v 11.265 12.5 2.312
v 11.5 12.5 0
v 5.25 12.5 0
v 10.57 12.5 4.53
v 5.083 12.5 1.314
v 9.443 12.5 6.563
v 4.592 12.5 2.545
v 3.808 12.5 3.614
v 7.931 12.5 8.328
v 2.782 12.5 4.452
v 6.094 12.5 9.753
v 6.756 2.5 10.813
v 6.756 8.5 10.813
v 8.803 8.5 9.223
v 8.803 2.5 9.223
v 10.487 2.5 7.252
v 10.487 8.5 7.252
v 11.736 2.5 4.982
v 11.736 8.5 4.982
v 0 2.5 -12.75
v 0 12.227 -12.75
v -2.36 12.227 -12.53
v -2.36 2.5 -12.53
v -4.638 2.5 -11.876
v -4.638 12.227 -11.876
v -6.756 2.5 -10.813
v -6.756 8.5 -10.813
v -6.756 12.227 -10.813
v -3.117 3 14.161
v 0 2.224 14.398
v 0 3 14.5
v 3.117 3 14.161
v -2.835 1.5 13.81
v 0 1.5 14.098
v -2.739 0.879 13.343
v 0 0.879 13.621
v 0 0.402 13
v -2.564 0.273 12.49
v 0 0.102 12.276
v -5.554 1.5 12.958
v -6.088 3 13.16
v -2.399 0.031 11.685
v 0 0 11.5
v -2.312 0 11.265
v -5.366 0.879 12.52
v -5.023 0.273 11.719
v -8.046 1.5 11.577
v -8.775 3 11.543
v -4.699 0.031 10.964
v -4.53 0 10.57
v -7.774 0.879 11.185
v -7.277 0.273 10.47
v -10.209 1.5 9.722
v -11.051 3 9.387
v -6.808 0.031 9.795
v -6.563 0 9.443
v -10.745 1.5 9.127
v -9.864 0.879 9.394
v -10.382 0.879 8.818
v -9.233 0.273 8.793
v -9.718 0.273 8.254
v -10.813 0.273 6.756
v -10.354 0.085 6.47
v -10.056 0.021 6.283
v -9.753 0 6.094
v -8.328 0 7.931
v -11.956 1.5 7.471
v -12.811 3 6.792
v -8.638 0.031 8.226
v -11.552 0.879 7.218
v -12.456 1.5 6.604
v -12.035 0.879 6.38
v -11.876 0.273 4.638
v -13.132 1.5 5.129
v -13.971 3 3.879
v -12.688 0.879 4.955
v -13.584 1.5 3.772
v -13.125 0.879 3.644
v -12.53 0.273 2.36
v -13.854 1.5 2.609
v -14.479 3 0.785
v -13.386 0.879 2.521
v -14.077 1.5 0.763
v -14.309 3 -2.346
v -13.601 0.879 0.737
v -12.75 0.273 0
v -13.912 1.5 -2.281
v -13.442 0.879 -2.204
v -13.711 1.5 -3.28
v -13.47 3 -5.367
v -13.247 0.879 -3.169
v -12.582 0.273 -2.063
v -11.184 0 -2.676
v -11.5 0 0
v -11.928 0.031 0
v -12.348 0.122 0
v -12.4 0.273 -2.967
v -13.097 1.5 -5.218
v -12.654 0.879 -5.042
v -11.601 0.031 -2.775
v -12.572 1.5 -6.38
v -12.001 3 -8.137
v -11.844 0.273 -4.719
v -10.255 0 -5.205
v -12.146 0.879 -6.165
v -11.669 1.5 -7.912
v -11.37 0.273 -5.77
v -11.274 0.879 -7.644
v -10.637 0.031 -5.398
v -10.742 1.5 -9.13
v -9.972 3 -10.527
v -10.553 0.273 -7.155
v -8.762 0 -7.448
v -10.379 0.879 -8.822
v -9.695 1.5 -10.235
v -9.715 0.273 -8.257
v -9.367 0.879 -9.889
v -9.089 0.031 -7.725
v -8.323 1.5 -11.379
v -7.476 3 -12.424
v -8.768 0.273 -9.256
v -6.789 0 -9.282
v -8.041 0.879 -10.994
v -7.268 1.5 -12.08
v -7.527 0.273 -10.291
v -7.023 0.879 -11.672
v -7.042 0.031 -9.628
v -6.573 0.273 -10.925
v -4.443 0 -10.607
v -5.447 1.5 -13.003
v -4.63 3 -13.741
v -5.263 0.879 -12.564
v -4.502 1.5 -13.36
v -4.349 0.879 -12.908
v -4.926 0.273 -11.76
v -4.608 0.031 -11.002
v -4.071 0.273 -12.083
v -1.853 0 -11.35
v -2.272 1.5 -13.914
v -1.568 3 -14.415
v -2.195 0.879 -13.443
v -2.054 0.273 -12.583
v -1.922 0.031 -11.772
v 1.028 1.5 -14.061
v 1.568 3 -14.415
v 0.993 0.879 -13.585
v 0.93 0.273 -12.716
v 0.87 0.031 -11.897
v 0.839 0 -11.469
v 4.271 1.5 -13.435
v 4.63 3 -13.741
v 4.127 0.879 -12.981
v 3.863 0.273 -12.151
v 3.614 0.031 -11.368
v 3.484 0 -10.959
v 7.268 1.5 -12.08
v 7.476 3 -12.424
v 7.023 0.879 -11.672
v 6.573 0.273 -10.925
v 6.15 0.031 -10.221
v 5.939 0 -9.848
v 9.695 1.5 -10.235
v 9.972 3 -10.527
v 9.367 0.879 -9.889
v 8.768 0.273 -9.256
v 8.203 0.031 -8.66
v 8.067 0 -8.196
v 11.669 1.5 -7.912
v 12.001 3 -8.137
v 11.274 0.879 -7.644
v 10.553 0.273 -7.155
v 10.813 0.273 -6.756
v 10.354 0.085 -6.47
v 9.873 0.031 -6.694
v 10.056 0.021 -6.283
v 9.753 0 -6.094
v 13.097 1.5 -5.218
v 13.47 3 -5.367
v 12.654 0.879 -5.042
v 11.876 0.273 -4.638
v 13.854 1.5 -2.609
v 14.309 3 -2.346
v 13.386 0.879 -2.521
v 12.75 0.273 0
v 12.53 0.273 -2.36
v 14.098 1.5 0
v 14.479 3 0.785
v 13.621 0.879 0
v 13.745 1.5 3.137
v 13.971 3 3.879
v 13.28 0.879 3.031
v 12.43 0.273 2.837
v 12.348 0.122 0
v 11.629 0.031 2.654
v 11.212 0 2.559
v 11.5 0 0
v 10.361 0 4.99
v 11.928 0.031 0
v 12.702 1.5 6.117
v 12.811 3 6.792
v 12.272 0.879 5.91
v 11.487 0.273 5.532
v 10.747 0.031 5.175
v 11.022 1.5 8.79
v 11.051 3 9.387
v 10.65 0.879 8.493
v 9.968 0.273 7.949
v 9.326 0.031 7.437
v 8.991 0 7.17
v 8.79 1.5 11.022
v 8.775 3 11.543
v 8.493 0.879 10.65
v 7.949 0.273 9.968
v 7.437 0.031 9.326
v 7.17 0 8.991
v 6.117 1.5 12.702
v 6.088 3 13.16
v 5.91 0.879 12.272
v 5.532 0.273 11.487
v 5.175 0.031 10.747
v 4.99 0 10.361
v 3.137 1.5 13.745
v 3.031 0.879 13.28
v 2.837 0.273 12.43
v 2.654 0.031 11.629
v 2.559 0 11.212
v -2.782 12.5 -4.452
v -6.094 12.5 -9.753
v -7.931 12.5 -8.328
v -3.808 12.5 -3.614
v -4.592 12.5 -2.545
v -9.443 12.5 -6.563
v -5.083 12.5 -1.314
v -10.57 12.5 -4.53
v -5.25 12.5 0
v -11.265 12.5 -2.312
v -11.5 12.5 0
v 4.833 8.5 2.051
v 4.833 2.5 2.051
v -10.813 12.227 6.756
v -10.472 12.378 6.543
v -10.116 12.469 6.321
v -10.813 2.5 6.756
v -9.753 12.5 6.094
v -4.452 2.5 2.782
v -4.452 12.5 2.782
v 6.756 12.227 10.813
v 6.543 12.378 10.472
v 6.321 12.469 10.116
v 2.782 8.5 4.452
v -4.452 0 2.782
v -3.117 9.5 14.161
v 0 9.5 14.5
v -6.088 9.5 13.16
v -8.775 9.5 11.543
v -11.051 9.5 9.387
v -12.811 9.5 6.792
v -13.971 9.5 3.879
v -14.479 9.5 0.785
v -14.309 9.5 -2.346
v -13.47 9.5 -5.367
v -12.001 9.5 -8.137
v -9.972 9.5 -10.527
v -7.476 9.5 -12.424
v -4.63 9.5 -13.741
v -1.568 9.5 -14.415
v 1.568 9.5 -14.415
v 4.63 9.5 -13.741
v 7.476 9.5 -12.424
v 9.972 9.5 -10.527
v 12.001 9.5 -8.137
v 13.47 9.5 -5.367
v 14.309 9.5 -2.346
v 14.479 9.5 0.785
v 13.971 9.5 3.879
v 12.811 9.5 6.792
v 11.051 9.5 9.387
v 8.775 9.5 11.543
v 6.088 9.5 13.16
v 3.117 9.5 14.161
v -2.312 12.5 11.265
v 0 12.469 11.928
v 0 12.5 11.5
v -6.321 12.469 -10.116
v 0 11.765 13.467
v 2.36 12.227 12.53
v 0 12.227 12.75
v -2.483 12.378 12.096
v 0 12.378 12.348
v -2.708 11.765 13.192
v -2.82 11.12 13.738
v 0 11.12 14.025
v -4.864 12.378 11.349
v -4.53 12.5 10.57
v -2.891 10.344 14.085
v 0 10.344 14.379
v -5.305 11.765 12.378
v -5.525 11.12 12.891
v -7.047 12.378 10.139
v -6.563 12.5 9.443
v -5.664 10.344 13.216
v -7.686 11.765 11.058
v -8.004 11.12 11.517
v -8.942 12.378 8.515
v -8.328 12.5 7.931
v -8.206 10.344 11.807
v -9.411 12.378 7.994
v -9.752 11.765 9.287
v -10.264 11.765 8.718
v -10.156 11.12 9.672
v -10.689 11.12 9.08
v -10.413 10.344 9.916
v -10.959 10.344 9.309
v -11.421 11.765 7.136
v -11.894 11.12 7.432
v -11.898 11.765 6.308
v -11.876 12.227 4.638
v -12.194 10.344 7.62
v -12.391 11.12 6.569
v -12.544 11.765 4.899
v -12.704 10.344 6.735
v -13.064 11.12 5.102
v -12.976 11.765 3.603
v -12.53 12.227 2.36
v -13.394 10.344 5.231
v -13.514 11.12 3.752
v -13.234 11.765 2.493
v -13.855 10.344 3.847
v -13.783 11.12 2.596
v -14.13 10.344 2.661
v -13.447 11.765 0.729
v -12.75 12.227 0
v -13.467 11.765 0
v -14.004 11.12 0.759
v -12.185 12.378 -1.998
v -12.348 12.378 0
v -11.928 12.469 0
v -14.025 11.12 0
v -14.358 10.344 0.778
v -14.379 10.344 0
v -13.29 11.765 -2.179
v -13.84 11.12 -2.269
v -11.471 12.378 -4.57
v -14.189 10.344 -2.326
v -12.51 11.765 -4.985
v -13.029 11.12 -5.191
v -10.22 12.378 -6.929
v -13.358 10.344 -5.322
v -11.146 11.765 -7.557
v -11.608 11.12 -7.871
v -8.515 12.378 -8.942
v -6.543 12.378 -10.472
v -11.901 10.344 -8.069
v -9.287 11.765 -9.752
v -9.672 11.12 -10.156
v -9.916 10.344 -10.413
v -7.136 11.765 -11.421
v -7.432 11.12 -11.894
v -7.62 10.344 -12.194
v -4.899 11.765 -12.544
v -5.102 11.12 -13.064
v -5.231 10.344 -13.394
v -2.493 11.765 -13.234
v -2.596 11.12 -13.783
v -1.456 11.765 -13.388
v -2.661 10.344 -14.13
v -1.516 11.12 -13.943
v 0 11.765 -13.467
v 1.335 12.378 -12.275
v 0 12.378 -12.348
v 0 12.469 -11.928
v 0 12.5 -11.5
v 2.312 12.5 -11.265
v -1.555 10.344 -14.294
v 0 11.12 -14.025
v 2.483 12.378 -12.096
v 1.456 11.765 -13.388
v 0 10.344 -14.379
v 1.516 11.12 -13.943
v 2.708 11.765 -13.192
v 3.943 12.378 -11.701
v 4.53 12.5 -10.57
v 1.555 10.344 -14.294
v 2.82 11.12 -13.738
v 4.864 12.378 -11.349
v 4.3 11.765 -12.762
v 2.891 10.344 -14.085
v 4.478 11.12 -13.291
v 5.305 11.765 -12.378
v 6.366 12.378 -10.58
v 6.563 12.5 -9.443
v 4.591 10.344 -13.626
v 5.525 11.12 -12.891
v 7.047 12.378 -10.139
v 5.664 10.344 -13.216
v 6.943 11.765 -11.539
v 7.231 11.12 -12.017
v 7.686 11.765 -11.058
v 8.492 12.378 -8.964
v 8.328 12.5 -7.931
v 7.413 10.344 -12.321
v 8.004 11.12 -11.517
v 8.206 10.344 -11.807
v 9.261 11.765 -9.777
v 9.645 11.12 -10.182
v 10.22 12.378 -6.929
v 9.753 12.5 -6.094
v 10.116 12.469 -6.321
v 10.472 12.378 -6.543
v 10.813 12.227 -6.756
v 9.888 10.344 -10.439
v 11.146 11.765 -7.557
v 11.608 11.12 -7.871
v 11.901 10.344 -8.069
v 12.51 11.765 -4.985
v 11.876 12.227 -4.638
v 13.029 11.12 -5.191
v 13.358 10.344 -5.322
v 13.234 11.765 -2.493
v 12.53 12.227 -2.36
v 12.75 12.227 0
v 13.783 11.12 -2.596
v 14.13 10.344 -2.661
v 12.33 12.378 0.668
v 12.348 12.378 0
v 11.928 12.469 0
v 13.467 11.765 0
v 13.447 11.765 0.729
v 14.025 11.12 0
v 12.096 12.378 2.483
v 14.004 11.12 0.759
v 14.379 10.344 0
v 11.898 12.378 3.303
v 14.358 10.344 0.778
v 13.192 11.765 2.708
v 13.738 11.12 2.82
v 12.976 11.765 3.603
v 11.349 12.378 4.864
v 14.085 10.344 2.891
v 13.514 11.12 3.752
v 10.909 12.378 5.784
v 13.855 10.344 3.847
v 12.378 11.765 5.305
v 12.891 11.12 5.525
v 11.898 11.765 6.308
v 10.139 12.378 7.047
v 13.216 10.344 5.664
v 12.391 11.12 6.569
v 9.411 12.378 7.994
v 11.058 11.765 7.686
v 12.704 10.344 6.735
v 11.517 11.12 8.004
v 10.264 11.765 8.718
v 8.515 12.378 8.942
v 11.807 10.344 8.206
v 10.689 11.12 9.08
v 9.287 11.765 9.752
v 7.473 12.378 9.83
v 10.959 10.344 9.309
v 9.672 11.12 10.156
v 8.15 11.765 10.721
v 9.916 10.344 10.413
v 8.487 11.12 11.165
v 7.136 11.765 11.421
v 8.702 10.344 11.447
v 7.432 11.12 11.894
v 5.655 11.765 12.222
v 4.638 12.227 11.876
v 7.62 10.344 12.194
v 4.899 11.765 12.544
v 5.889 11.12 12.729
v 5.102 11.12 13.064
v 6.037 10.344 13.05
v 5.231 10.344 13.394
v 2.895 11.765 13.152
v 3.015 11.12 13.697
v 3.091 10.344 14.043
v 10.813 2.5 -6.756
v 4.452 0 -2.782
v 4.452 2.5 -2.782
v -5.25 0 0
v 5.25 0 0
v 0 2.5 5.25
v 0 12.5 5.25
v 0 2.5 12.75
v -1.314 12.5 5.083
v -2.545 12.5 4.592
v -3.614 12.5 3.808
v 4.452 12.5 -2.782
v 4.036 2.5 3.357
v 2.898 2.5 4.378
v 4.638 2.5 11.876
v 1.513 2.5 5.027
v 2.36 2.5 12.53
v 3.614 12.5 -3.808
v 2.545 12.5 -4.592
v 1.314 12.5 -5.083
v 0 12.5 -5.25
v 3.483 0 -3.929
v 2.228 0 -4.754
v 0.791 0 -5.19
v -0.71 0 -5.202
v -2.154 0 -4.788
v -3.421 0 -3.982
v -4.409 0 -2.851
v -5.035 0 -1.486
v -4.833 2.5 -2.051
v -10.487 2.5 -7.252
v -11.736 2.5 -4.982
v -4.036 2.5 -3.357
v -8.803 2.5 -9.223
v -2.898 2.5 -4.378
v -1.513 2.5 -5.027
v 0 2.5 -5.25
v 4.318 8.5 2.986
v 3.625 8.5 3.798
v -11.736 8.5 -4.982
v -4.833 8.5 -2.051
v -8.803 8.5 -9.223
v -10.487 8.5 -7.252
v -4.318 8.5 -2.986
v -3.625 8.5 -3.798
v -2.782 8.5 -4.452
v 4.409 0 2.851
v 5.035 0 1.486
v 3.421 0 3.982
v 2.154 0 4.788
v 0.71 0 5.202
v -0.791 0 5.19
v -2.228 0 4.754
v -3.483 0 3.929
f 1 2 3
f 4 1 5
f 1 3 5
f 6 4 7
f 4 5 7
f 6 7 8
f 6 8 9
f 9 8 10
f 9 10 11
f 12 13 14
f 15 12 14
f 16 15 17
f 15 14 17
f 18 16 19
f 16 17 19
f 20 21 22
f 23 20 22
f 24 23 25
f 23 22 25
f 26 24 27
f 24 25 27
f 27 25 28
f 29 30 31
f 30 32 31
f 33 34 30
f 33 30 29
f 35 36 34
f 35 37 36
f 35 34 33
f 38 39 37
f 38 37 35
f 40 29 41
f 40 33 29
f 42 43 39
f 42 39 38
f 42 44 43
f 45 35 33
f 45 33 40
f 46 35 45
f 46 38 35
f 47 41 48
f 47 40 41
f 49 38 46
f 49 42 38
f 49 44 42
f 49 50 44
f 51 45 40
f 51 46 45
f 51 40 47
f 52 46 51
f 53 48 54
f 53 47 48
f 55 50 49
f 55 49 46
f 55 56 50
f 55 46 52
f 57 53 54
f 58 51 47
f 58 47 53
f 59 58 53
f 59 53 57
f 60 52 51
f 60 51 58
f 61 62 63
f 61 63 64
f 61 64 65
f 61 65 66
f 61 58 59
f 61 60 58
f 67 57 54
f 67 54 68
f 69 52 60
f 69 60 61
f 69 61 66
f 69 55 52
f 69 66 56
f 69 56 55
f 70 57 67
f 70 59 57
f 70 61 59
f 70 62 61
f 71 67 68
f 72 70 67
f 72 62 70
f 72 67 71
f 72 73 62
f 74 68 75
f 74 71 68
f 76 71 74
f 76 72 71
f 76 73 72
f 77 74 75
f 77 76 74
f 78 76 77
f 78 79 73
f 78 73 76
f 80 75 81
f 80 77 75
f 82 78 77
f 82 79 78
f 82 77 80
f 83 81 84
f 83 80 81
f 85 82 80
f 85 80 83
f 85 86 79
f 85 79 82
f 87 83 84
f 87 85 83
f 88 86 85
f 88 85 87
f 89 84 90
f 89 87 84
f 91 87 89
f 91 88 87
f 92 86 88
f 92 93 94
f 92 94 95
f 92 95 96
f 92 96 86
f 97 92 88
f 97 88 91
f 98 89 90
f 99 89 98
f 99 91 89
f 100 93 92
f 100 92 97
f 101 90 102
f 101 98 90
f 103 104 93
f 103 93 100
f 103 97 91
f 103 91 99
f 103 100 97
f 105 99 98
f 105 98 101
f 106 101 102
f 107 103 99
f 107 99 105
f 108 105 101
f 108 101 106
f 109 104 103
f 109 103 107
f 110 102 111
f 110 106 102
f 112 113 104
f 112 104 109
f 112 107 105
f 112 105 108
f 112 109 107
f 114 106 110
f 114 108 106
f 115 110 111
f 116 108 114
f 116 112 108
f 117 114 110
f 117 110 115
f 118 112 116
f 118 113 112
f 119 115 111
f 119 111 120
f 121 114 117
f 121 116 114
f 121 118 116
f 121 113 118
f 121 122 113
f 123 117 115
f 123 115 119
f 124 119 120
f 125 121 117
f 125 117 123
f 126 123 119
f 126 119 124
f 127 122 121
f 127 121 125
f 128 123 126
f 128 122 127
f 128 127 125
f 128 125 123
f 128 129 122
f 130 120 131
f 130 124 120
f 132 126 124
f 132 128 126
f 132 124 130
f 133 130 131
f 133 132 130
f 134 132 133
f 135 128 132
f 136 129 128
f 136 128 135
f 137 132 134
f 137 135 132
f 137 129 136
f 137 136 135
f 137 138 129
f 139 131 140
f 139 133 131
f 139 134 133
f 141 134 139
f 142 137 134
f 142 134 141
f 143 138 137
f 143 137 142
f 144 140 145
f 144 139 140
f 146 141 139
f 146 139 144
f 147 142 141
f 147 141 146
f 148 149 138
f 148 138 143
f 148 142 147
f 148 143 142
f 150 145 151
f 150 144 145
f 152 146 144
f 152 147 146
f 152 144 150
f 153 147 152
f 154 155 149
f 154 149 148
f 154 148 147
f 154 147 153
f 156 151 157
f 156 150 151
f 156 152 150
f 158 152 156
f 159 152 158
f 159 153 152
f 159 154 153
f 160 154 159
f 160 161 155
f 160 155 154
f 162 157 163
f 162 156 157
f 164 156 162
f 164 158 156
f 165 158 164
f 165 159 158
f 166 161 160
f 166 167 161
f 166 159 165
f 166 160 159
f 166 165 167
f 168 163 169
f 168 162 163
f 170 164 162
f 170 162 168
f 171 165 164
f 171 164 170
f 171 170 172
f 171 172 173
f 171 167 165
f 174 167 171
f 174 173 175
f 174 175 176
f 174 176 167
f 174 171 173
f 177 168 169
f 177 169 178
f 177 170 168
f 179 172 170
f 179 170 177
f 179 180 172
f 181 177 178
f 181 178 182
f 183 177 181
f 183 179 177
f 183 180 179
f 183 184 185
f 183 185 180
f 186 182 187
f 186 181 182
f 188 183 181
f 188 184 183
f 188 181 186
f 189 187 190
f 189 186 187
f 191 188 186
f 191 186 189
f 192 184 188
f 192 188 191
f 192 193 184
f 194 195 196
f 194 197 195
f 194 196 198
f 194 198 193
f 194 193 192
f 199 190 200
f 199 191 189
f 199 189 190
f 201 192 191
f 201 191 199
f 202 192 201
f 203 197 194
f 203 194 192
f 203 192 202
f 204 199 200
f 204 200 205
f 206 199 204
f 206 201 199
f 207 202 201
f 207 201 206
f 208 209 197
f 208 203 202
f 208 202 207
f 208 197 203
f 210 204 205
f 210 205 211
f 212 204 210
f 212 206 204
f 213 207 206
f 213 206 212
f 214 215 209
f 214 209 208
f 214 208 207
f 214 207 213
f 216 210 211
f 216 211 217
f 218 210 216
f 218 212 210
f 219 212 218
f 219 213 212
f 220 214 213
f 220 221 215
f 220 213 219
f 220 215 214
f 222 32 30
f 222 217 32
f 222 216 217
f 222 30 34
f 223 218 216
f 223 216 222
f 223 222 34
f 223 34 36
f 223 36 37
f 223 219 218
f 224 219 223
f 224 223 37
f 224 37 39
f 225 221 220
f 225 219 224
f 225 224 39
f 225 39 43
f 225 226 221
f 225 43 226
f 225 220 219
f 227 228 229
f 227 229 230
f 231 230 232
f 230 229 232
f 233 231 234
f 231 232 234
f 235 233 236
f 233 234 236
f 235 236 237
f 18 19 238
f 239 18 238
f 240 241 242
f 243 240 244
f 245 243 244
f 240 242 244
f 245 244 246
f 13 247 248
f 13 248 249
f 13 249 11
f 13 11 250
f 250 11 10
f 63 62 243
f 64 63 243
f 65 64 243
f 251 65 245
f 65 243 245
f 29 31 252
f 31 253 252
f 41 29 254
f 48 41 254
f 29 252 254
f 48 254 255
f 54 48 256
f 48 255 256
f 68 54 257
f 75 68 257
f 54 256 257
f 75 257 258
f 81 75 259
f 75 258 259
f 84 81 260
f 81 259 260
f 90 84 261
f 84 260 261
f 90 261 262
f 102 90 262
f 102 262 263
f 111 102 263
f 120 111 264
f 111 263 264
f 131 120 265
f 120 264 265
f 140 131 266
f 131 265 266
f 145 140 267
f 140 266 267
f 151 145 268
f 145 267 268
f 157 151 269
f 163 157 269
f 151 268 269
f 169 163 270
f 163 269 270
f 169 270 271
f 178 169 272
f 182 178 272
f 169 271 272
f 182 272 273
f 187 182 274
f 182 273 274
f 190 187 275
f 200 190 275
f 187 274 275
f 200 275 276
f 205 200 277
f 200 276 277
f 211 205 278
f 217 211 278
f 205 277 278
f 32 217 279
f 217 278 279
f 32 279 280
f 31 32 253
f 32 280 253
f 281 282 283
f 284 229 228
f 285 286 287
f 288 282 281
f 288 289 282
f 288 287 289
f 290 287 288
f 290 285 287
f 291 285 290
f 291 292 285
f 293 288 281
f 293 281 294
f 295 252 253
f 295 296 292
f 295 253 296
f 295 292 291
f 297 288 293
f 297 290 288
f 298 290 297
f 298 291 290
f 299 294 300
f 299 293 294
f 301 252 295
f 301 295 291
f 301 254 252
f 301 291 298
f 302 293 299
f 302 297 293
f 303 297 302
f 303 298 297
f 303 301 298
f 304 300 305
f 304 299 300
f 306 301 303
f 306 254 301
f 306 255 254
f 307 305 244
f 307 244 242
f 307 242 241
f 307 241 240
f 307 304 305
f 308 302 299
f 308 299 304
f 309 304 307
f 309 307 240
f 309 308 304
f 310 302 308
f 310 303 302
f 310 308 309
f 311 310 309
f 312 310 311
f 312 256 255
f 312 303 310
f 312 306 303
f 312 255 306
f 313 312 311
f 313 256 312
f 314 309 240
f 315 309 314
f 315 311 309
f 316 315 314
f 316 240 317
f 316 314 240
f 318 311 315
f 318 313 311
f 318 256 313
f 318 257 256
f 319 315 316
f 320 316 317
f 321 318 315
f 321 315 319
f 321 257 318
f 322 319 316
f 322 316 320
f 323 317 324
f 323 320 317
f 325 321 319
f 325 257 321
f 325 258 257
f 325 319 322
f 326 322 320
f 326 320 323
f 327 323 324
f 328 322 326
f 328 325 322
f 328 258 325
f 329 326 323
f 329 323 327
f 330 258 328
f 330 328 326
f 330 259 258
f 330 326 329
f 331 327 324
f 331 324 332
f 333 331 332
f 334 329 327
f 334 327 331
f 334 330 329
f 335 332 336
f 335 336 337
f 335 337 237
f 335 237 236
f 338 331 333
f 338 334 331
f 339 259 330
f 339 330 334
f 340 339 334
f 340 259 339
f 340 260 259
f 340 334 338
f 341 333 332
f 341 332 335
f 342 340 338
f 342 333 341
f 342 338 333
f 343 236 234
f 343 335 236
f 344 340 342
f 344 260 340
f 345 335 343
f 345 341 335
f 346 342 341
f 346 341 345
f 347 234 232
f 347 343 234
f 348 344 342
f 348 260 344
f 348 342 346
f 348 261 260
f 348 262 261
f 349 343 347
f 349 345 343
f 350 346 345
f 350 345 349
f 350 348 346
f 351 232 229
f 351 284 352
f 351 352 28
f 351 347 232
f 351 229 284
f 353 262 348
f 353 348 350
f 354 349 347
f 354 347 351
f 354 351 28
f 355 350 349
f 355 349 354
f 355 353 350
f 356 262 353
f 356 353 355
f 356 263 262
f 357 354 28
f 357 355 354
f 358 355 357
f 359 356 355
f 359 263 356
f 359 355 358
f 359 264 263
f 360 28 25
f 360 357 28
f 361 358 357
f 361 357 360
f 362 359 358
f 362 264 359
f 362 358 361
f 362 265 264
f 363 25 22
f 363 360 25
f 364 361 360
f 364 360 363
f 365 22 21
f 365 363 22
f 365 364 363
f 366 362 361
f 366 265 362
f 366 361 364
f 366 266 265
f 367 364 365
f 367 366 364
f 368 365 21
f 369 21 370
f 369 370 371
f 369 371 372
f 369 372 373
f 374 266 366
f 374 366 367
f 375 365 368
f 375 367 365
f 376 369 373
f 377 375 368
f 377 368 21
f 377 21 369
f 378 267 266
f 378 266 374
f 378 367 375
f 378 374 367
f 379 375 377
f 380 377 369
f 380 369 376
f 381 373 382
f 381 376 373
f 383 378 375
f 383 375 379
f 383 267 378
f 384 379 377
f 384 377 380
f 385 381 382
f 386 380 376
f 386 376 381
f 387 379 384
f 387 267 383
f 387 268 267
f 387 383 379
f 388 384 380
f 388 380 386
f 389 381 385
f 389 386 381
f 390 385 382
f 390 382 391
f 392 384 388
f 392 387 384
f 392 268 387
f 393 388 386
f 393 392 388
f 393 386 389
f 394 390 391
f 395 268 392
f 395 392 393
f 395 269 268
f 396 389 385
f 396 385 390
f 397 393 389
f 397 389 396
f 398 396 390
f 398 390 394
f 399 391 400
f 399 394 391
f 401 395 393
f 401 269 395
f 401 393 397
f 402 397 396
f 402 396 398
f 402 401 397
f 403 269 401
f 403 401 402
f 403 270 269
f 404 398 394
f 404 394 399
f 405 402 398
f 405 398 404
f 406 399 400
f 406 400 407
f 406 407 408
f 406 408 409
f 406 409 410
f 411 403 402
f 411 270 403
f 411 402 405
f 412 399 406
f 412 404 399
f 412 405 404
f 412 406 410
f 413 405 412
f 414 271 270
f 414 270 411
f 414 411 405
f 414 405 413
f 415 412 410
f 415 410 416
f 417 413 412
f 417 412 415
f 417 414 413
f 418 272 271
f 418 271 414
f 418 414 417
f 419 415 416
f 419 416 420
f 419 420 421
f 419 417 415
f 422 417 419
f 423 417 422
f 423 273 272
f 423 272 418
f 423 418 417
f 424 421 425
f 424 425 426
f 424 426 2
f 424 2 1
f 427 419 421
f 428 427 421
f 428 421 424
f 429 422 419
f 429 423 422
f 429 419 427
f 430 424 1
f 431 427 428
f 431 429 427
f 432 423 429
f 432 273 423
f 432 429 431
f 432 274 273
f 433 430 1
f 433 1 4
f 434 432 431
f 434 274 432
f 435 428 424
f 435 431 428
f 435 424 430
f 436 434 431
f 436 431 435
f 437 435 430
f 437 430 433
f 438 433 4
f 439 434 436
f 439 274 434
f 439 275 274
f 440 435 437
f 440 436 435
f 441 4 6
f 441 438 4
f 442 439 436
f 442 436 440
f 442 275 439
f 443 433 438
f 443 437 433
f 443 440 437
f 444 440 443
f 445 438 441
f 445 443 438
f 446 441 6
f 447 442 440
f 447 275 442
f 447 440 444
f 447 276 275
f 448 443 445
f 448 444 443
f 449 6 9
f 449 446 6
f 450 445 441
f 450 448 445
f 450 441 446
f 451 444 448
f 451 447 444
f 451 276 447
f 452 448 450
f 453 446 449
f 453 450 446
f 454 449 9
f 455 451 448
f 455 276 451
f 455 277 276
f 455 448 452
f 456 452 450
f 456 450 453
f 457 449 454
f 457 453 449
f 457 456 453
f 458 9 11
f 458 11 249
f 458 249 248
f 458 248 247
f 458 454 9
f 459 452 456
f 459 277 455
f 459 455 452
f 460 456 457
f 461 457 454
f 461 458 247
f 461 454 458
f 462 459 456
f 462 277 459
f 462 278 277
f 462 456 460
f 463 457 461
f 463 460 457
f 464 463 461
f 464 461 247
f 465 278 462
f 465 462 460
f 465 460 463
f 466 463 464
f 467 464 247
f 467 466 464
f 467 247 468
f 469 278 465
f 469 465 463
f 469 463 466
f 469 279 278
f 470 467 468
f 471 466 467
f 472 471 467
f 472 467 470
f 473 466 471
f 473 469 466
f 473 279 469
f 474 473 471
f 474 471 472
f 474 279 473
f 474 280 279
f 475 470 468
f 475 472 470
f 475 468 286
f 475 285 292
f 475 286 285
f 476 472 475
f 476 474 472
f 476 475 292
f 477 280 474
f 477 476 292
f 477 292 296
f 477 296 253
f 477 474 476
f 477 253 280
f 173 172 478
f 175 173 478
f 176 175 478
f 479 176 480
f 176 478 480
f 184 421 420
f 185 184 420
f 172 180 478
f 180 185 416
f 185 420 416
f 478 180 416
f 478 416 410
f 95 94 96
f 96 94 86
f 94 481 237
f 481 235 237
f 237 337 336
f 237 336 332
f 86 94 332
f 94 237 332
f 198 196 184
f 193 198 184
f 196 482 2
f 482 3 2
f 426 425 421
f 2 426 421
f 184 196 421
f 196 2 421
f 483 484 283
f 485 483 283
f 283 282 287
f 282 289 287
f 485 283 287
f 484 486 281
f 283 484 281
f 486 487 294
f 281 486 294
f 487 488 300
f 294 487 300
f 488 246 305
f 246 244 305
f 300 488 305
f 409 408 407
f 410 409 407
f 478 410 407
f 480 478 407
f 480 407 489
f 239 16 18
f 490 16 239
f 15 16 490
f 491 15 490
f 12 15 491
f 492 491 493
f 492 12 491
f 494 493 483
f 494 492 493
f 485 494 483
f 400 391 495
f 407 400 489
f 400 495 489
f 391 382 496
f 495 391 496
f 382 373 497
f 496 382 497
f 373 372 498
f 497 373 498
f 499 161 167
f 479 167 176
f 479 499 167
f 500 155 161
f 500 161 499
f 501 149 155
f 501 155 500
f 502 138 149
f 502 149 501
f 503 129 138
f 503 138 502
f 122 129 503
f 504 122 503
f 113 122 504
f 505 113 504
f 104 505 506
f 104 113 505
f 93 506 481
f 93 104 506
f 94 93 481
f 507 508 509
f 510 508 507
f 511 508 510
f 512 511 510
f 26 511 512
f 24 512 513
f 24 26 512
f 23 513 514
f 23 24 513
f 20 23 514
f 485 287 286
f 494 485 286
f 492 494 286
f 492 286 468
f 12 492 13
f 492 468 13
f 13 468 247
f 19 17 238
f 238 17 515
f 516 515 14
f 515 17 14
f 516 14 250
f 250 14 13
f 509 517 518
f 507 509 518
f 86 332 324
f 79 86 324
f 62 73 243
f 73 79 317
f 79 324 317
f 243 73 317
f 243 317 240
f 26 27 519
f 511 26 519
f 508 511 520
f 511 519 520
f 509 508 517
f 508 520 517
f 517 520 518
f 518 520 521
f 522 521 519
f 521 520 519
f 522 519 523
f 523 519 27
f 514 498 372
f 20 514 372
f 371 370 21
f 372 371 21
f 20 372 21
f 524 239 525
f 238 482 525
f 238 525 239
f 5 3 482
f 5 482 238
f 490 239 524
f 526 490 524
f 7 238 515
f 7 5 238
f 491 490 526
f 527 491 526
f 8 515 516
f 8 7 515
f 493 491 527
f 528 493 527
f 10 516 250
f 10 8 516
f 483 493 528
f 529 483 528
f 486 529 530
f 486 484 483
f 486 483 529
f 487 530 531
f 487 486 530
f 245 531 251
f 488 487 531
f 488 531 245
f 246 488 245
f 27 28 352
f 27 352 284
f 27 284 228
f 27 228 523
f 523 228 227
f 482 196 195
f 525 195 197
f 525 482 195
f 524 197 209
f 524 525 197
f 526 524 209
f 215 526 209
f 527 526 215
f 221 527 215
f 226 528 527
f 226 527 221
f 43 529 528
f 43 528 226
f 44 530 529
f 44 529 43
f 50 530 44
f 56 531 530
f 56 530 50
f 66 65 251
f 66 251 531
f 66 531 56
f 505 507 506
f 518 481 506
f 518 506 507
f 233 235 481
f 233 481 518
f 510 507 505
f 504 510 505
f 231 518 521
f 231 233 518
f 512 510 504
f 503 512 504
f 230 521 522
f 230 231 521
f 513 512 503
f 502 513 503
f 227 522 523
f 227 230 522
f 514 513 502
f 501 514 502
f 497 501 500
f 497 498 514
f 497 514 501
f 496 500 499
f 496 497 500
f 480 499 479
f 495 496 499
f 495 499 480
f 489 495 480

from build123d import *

# Parameters (mm, degrees)
SKETCH2_W          = 9.25
SKETCH2_H          = 12.5
CUT_EXTRUDE1_DEPTH = 10
CIRPATTERN1_COUNT  = 4
CUT_EXTRUDE2_DEPTH = 10
CUT_EXTRUDE3_START = 6
CUT_EXTRUDE3_DEPTH = 6
CIRPATTERN2_COUNT  = 2
FILLET1_R          = 3


with BuildPart() as part:
    # Sketch2 → Revolve1 (revolve)
    with BuildSketch(Plane(origin=(0, 0, 0), x_dir=(0, 0, -1), z_dir=(1, 0, 0))):
        with Locations((-9.875, 6.25)):
            Rectangle(SKETCH2_W, SKETCH2_H)
    revolve(axis=Axis((0, 31, 0), (0, -1, 0)))

    # Sketch3 → Cut-Extrude1 (cut)
    with BuildSketch(Plane(origin=(0, 12.5, 0), x_dir=(1, 0, 0), z_dir=(0, 1, 0))):
        with BuildLine():
            Line((-6.756470619, 10.812613226), (0, 0))
            Line((0, 0), (0, 12.75))
            ThreePointArc((0, 12.75), (-3.514376287, 12.256086623), (-6.756470619, 10.812613226))
        make_face()
    cut_extrude1 = extrude(amount=-CUT_EXTRUDE1_DEPTH, mode=Mode.SUBTRACT)

    # CirPattern1: Cut-Extrude1 ×4 about axis
    cirpattern1_axis = Axis((0, 12.5, 0), (0, 1, 0))
    for i in range(1, CIRPATTERN1_COUNT):
        add(cut_extrude1.rotate(cirpattern1_axis, i * 360 / CIRPATTERN1_COUNT), mode=Mode.SUBTRACT)

    # Sketch4 → Cut-Extrude2 (cut)
    with BuildSketch(Plane(origin=(0, 2.5, 0), x_dir=(1, 0, 0), z_dir=(0, 1, 0))):
        with BuildLine():
            Line((5.25, 0), (12.75, 0))
            ThreePointArc((12.75, 0), (12.256086623, 3.514376287), (10.812613226, 6.756470619))
            Line((10.812613226, 6.756470619), (4.452252505, 2.782076137))
            ThreePointArc((4.452252505, 2.782076137), (5.046623904, 1.447096118), (5.25, 0))
        make_face()
        with BuildLine():
            Line((-5.25, 0), (-12.75, 0))
            ThreePointArc((-12.75, 0), (-12.256086623, -3.514376287), (-10.812613226, -6.756470619))
            Line((-10.812613226, -6.756470619), (-4.452252505, -2.782076137))
            ThreePointArc((-4.452252505, -2.782076137), (-5.046623904, -1.447096118), (-5.25, 0))
        make_face()
    extrude(amount=-CUT_EXTRUDE2_DEPTH, mode=Mode.SUBTRACT)

    # Sketch5 → Cut-Extrude3 (cut)
    with BuildSketch(Plane(origin=(0, 2.5, 0), x_dir=(1, 0, 0), z_dir=(0, 1, 0)).offset(CUT_EXTRUDE3_START)):
        with BuildLine():
            Line((0, 0), (-6.756470619, 10.812613226))
            ThreePointArc((-6.756470619, 10.812613226), (-9.695176061, 8.280462616), (-11.736436882, 4.981821888))
            Line((-11.736436882, 4.981821888), (0, 0))
        make_face()
    cut_extrude3 = extrude(amount=-CUT_EXTRUDE3_DEPTH, mode=Mode.SUBTRACT)

    # CirPattern2: Cut-Extrude3 ×2 about axis
    cirpattern2_axis = Axis((0, 12.5, 0), (0, 1, 0))
    for i in range(1, CIRPATTERN2_COUNT):
        add(cut_extrude3.rotate(cirpattern2_axis, i * 360 / CIRPATTERN2_COUNT), mode=Mode.SUBTRACT)

    # Fillet1
    # the kernel refuses this fillet: 3 mm, written as the material it takes off along each edge
    with BuildSketch(Plane(origin=(0, 12.5, 0), x_dir=(0, 0, 1), z_dir=(1, 0, 0))) as fillet1_piece_1:
        with BuildLine():
            CenterArc((14.5 - FILLET1_R, FILLET1_R), FILLET1_R, 270, 90)
            Line((14.5, FILLET1_R), (14.5, 0))
            Line((14.5, 0), (14.5 - FILLET1_R, 0))
        make_face()
    revolve(axis=Axis((0, 12.5, 0), (0, -1, 0)), mode=Mode.SUBTRACT)
    with BuildSketch(Plane(origin=(0, 0, 0), x_dir=(0, 0, 1), z_dir=(1, 0, 0))) as fillet1_piece_2:
        with BuildLine():
            CenterArc((14.5 - FILLET1_R, -FILLET1_R), FILLET1_R, 360, 90)
            Line((14.5, -FILLET1_R), (14.5, 0))
            Line((14.5, 0), (14.5 - FILLET1_R, 0))
        make_face()
    revolve(axis=Axis((0, 0, 0), (0, -1, 0)), mode=Mode.SUBTRACT)


solid = part.part
